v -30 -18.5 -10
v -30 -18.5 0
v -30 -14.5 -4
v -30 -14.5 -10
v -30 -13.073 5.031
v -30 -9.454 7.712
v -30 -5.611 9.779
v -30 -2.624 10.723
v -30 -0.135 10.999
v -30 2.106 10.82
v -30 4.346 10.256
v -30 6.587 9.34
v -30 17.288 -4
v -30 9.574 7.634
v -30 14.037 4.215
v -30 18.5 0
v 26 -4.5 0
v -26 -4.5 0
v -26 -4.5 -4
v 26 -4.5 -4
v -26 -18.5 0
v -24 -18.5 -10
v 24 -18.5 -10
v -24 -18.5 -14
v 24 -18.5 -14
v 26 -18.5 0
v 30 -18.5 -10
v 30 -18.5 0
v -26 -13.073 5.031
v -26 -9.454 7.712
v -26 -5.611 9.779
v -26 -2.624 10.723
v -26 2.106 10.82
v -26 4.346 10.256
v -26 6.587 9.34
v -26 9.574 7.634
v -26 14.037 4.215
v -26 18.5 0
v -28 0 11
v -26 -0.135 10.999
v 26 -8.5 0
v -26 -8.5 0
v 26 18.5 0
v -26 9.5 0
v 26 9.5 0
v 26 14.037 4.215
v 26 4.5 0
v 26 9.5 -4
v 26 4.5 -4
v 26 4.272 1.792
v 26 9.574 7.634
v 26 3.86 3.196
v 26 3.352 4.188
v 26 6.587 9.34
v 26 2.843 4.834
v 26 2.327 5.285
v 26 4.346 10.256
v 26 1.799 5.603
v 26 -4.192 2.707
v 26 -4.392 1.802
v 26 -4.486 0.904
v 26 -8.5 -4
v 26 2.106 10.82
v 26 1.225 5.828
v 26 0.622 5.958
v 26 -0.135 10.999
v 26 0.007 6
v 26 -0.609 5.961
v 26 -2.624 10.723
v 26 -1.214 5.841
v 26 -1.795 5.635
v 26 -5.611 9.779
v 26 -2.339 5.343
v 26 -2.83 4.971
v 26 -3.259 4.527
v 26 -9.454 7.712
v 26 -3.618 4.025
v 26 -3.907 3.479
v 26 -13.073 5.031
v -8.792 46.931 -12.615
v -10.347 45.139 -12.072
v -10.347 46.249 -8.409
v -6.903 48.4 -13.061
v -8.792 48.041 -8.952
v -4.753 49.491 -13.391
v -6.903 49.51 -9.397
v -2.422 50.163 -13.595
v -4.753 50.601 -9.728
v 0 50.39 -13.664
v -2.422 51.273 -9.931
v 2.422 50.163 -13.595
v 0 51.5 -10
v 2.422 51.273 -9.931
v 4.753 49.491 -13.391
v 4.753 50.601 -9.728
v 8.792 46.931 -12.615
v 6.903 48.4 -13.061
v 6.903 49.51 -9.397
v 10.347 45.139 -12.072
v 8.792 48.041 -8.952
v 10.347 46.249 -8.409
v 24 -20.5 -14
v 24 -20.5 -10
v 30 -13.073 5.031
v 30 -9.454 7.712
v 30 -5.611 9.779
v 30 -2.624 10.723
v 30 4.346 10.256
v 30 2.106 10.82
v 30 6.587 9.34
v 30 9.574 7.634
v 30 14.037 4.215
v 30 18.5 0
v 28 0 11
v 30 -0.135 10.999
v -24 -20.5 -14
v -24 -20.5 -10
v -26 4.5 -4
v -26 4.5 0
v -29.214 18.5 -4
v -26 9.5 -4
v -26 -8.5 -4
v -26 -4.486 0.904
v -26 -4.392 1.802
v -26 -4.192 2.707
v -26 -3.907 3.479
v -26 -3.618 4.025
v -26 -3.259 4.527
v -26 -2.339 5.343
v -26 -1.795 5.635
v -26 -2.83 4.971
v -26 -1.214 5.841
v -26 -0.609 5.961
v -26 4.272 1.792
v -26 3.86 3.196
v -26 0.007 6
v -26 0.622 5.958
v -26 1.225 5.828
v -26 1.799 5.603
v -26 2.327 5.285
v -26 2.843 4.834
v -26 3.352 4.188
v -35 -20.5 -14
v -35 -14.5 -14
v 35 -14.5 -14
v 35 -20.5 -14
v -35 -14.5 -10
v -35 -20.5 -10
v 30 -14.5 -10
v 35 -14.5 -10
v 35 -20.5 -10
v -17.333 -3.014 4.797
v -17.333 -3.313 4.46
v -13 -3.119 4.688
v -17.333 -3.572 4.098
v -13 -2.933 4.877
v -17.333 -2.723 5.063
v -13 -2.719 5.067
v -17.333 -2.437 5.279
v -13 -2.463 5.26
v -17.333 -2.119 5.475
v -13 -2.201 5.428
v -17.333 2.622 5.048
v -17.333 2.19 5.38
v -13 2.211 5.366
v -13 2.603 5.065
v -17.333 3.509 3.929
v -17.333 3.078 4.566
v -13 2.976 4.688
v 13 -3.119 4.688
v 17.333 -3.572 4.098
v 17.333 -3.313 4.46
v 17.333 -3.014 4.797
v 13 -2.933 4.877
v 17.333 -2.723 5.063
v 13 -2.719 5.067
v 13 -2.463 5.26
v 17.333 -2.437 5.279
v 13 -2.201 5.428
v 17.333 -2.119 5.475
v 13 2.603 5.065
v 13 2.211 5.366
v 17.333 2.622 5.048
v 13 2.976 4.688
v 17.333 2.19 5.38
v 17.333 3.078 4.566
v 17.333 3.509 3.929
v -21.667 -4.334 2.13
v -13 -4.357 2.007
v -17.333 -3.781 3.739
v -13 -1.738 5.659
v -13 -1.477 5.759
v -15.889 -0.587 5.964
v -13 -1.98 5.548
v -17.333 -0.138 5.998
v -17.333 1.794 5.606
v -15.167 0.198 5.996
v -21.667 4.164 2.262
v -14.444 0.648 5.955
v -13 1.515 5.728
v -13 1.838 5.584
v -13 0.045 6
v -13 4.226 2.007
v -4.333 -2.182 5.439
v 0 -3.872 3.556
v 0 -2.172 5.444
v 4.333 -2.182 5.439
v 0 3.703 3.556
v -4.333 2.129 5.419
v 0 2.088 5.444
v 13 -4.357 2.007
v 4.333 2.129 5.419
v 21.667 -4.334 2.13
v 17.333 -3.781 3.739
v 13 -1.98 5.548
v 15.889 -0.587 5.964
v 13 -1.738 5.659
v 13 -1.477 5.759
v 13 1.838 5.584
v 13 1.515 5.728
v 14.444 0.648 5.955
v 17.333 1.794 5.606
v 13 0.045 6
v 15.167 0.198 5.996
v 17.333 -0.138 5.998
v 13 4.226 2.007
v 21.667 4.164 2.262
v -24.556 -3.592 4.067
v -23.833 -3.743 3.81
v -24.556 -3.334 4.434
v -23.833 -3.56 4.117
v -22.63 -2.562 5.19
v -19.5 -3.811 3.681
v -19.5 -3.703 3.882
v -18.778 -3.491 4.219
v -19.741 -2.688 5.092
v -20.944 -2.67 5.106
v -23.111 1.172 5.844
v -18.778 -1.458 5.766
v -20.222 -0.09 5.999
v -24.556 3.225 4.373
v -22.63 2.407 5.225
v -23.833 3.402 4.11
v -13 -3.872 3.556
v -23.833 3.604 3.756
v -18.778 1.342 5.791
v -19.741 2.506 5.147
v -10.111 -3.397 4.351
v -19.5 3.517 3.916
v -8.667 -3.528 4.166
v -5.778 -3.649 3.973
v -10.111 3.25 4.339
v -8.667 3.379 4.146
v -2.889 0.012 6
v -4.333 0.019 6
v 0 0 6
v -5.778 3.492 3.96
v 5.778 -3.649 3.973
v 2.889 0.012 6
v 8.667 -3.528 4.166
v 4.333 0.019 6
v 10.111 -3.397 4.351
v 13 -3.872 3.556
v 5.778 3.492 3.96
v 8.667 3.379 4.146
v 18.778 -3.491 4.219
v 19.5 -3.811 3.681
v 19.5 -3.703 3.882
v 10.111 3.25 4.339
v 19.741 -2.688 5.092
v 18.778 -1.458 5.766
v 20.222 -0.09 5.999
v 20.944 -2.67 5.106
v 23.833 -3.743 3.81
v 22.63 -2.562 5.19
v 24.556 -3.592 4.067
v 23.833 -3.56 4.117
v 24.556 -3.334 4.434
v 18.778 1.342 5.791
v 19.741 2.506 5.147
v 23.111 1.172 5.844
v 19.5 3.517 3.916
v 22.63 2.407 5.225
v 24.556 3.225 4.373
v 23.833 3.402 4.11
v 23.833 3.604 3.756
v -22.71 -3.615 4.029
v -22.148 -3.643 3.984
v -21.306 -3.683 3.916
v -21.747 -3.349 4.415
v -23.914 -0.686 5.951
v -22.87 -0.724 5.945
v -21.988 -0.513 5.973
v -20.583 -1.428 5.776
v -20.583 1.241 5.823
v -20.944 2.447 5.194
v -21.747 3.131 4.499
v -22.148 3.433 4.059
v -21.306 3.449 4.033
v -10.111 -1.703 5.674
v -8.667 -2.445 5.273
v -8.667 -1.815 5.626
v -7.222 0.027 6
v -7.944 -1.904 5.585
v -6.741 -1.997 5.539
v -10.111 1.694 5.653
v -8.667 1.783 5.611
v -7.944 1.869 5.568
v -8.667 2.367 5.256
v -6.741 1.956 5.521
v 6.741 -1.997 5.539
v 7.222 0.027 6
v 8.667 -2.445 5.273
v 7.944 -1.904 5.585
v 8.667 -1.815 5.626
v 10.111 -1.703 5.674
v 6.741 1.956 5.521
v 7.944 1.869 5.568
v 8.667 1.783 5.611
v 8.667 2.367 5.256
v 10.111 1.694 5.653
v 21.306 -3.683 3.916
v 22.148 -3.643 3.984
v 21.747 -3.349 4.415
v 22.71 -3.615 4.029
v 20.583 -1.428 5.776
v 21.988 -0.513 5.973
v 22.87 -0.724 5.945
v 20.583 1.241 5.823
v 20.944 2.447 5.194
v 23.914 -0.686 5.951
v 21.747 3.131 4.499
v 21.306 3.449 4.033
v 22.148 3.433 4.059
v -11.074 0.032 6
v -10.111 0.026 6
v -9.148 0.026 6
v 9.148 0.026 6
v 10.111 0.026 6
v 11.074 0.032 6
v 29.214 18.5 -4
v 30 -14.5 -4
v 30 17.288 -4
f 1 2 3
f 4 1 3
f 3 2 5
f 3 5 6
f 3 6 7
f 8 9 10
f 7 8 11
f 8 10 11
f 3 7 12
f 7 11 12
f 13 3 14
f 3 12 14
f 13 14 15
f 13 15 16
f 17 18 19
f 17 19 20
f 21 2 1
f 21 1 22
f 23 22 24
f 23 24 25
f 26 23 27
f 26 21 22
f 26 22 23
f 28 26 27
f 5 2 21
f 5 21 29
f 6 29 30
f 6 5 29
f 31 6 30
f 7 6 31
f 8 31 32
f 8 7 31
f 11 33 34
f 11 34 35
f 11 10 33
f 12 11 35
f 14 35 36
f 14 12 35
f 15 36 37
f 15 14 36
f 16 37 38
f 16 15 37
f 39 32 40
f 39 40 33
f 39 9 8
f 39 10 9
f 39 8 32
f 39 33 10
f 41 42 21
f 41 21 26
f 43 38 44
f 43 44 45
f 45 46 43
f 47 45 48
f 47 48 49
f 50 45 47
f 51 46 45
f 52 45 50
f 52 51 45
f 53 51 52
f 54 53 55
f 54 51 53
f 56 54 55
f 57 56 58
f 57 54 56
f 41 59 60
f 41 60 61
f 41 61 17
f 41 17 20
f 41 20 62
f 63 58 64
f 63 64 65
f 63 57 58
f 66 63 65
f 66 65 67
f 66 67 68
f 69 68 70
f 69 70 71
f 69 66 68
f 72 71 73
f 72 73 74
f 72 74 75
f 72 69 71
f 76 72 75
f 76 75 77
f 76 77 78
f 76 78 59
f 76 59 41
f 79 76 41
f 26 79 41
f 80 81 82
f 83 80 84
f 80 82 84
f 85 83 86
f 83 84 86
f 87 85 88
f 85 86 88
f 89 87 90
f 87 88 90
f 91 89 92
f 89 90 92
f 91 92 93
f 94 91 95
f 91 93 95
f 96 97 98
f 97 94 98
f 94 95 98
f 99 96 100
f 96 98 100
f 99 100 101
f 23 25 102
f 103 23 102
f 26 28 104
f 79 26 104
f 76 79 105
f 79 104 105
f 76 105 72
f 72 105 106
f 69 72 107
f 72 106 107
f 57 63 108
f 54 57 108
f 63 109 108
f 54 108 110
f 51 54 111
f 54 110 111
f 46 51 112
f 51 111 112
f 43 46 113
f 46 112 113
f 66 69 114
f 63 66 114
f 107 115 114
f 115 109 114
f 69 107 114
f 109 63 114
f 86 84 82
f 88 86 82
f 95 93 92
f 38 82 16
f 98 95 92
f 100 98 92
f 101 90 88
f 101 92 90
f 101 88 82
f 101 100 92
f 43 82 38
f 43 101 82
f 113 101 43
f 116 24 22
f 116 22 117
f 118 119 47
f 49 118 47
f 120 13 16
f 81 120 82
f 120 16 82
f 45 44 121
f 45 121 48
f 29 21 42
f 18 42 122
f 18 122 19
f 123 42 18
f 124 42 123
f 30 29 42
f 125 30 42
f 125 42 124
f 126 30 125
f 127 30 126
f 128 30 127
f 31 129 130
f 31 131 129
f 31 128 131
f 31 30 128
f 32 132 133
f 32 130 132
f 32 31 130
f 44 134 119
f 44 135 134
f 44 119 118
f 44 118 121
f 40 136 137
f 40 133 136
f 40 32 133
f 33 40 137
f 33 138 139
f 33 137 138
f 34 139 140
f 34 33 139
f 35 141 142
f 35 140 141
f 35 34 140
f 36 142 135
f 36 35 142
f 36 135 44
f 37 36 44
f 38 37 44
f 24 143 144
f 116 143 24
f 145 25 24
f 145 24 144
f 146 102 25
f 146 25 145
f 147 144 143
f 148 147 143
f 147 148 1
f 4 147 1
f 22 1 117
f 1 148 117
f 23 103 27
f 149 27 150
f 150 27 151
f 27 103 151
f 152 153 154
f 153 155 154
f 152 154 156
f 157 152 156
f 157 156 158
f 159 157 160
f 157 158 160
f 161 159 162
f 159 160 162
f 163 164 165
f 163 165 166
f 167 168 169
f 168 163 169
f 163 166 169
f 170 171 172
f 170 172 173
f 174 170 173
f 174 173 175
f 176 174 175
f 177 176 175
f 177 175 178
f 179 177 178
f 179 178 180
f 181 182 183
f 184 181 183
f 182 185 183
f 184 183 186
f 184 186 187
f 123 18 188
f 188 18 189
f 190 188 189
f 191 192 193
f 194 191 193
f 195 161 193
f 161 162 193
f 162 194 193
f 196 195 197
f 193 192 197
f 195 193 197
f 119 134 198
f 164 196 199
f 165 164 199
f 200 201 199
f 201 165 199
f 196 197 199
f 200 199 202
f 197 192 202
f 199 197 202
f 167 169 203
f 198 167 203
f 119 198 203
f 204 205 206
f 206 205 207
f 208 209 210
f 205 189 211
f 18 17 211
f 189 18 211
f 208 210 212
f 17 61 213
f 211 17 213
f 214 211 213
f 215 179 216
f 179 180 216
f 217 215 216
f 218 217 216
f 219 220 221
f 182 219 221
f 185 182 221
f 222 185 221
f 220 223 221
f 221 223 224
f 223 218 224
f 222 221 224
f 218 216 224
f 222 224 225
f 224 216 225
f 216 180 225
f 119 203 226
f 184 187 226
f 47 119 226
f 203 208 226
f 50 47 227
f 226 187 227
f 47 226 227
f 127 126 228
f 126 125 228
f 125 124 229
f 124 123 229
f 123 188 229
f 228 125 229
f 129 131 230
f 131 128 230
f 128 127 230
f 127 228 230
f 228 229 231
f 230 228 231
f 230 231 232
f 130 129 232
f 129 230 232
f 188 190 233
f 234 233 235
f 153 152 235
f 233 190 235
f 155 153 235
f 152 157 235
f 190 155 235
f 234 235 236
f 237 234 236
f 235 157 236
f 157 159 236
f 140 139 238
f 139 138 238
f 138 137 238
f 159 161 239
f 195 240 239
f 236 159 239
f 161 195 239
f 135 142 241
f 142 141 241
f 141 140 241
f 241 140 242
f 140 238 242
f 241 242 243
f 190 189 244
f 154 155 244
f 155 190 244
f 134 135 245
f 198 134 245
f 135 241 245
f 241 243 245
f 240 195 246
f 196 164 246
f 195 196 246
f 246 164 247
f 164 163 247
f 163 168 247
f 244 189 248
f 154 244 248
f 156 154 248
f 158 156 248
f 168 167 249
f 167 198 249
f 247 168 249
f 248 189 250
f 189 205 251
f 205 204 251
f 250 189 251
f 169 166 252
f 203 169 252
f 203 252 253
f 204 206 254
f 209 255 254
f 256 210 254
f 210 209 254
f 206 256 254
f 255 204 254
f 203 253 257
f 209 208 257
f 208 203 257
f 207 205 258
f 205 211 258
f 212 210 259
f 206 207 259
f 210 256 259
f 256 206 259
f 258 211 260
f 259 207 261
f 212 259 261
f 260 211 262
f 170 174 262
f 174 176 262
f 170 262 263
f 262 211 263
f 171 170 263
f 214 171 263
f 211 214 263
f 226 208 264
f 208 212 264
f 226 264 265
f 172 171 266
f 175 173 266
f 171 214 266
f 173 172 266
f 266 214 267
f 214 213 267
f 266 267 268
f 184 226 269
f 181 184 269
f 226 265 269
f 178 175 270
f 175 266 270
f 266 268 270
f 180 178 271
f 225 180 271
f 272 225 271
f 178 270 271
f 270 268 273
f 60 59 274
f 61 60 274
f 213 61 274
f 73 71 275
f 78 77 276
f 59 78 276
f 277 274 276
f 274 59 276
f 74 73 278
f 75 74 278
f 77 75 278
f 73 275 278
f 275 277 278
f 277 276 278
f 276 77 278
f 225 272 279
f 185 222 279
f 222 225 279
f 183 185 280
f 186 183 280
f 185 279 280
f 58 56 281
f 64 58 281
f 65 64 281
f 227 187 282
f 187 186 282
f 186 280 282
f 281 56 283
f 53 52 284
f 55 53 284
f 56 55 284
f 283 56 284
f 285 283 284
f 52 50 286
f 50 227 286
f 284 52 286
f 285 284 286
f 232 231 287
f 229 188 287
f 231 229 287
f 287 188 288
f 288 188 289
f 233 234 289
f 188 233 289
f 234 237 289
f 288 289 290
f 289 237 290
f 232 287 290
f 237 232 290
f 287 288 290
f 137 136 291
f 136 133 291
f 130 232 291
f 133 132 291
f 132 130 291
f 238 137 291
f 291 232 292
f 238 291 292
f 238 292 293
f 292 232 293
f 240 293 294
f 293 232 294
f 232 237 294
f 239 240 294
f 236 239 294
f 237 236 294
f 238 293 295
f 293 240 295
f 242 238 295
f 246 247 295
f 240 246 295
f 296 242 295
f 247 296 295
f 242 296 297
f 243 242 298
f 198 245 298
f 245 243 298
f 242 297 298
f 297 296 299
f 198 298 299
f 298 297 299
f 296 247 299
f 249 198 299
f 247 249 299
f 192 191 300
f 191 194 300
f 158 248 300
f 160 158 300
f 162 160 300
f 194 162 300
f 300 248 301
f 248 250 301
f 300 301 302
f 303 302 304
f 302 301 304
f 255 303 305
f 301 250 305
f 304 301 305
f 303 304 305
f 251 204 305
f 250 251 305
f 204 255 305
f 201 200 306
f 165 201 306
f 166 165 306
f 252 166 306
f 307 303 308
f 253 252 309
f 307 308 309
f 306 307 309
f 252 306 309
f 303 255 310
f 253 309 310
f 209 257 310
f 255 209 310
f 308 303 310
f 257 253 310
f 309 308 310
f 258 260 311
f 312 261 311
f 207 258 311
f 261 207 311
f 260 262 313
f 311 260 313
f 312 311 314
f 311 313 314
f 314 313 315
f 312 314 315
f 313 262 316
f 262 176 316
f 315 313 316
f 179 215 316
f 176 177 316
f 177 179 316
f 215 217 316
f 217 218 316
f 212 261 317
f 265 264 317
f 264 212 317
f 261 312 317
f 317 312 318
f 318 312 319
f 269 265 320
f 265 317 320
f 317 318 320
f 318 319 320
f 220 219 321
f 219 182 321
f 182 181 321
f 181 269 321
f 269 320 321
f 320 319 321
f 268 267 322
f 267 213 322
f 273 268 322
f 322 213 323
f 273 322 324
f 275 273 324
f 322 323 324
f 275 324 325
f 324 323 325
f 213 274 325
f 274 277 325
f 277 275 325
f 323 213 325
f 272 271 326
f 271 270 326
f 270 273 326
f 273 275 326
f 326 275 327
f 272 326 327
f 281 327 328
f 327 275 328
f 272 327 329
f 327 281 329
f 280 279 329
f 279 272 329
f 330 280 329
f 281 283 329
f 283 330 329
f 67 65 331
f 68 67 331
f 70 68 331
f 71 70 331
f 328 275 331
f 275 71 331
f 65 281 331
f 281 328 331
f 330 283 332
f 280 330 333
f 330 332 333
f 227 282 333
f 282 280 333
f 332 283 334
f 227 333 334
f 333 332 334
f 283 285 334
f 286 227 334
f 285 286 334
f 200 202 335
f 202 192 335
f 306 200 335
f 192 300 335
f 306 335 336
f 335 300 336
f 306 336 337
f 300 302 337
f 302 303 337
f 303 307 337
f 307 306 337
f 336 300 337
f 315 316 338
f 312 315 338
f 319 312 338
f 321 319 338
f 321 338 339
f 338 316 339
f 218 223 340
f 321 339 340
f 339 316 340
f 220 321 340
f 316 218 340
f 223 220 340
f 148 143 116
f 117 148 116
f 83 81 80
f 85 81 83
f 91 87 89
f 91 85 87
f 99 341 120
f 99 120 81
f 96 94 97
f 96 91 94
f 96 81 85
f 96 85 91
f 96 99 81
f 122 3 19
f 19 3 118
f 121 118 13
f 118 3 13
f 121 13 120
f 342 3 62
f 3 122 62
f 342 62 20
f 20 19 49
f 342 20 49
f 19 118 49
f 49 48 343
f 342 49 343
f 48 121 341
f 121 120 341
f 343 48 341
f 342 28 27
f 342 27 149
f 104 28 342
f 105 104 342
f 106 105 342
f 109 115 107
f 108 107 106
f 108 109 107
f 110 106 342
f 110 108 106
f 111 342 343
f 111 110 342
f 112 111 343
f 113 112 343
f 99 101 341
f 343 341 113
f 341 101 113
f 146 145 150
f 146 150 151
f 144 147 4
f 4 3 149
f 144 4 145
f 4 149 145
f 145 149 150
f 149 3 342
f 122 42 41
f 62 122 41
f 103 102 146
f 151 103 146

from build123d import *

# Parameters (mm, degrees)
F0_W      = 60
F0_H      = 37
F1_DEPTH  = 4
F3_DEPTH  = 4
F6_DEPTH  = 60
F8_W      = 52
F8_H      = 5
F7_W      = 52
F7_H      = 4
F9_DEPTH  = 25
F10_W     = 60
F10_H     = 4
F11_DEPTH = 10
F12_W     = 11
F12_H     = 6
F13_DEPTH = 4
F15_DEPTH = 60
F17_DEPTH = 25


with BuildPart() as f1:
    # F0 (on Top) → F1 (new body)
    with BuildSketch(Plane.XY):
        Rectangle(F0_W, F0_H)
    extrude(amount=-F1_DEPTH)

    # F4: F3 across plane


with BuildPart() as f3:
    # F2 (on face) → F3 (new body)
    with BuildSketch(Plane.YZ.offset(30)):
        with BuildLine():
            add(Edge.make_bspline(
                [(-18.5, 0), (-12.3333333333, 6.2487446703), (0, 15.7512553297), (12.3333333333, 6.2487446703), (18.5, 0)],
                knots=[0, 0, 0, 0, 0.5, 1, 1, 1, 1], degree=3))
            Line((-18.5, 0), (18.5, 0))
        make_face()
    extrude(amount=-F3_DEPTH)


with BuildPart() as f1_1:
    add(f1.part)
    add(f3.part.mirror(Plane.YZ))


    add(f3.part)  # F6 merges F3
    # F5 (on face) → F6 (join, through all)
    with BuildSketch(Plane.YZ.offset(30)):
        with BuildLine():
            add(Edge.make_bspline(
                [(-4.5, 0), (-4.6072629509, 4.5), (0.1894585205, 7.5), (4.22834591, 4.5), (4.5, 0)],
                knots=[0, 0, 0, 0, 0.5, 1, 1, 1, 1], degree=3))
            Line((-4.5, 0), (4.5, 0))
        make_face()
    extrude(amount=-F6_DEPTH)

    # F8 (on face) + F7 (on face) → F9 (cut)
    with BuildSketch(Plane.XY):
        with Locations((0, 7)):
            Rectangle(F8_W, F8_H)
    with BuildSketch(Plane.XY):
        with Locations((0, -6.5)):
            Rectangle(F7_W, F7_H)
    extrude(amount=-F9_DEPTH, mode=Mode.SUBTRACT)

    # F10 (on face) → F11 (join)
    with BuildSketch(Plane(origin=(0, 0, -4), x_dir=(1, 0, 0), z_dir=(0, 0, -1))):
        with Locations((0, 16.5)):
            Rectangle(F10_W, F10_H)
    extrude(amount=F11_DEPTH)

    # F12 (on face) → F13 (join)
    with BuildSketch(Plane(origin=(0, 0, -14), x_dir=(1, 0, 0), z_dir=(0, 0, -1))):
        with Locations((29.5, 17.5)):
            Rectangle(F12_W, F12_H)
        with Locations((-29.5, 17.5)):
            Rectangle(F12_W, F12_H)
    extrude(amount=-F13_DEPTH)

    # F14 (on face) → F15 (join, through all)
    with BuildSketch(Plane.YZ.offset(30)):
        Polygon((18.5, 0), (18.5, -4), (51.5, -14), (51.5, -10), align=None)
    extrude(amount=-F15_DEPTH)

    # F16 (on face) → F17 (cut)
    with BuildSketch(Plane(origin=(0, 1.5559293524, 5.1345668629), x_dir=(1, 0, 0), z_dir=(0, 0.2900073953, 0.9570244044))):
        with BuildLine():
            ThreePointArc((-10.3471690042, 46.7001105844), (0, 52.1868307812), (10.3471690042, 46.7001105844))
            Line((10.3471690042, 46.7001105844), (30, 17.704951482))
            Line((30, 17.704951482), (30, 52.1868307812))
            Line((30, 52.1868307812), (30, 58.4787502885))
            Line((30, 58.4787502885), (-30, 58.4787502885))
            Line((-30, 58.4787502885), (-30, 52.1868307812))
            Line((-30, 52.1868307812), (-30, 17.704951482))
            Line((-30, 17.704951482), (-10.3471690042, 46.7001105844))
        make_face()
    extrude(amount=-F17_DEPTH, mode=Mode.SUBTRACT)


solid = f1_1.part
